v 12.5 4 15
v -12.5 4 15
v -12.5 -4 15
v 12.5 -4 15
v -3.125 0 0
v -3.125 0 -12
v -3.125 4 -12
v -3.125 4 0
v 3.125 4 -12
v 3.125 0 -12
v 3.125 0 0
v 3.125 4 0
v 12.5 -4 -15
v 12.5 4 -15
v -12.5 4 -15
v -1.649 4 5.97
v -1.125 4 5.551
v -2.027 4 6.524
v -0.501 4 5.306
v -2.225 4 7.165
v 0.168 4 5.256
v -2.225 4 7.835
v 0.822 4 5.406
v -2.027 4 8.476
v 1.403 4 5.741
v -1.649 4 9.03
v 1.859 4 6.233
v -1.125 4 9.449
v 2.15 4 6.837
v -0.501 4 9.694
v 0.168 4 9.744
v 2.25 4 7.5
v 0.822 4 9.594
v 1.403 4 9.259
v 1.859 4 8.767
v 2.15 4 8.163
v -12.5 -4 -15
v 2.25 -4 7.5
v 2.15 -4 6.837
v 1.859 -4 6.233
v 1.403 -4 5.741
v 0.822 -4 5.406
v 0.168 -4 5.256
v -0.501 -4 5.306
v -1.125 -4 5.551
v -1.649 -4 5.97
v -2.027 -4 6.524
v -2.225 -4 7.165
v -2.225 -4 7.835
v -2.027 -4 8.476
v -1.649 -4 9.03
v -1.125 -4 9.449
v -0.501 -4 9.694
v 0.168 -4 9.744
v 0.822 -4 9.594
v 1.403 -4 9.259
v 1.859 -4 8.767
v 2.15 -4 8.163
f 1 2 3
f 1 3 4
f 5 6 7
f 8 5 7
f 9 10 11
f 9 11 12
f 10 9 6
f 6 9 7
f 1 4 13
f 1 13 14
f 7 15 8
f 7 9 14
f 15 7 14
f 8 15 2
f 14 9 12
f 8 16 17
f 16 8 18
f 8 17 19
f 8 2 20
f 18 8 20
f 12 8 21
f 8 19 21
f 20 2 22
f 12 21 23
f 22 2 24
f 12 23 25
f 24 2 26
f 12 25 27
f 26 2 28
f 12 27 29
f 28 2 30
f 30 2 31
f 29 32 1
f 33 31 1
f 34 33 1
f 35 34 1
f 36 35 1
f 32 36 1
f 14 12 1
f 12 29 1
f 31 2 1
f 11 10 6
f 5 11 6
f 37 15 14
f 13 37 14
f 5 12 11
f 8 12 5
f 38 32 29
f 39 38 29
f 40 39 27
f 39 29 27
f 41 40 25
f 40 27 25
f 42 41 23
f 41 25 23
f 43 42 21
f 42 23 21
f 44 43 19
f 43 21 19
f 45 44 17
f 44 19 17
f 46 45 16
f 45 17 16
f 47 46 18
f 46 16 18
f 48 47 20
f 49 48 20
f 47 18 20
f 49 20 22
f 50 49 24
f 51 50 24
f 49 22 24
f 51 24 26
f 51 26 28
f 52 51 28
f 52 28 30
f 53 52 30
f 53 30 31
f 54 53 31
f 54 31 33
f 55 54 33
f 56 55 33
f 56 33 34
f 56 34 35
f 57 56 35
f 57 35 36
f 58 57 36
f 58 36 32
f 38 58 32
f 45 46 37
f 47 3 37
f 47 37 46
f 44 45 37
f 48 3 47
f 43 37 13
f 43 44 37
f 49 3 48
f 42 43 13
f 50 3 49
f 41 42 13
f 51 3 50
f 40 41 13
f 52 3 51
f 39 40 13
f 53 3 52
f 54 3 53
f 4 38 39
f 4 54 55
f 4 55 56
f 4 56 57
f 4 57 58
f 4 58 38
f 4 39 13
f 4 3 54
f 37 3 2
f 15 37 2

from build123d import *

# Parameters (mm, degrees)
SKETCH1_W            = 25
SKETCH1_H            = 8
BOSS_EXTRUDE1_DEPTH  = 15
SKETCH3_W            = 6.25
SKETCH3_H            = 4
CUT_EXTRUDE1_DEPTH   = 12
M4_CLEARANCE_HOLE1_D = 4.5


with BuildPart() as part:
    # Sketch1 → Boss-Extrude1 (new, symmetric)
    with BuildSketch(Plane.XY):
        Rectangle(SKETCH1_W, SKETCH1_H)
    extrude(amount=BOSS_EXTRUDE1_DEPTH, both=True)

    # Sketch3 → Cut-Extrude1 (cut)
    with BuildSketch(Plane(origin=(0, 0, -12), x_dir=(-1, 0, 0), z_dir=(0, 0, -1))):
        with Locations((0, 2)):
            Rectangle(SKETCH3_W, SKETCH3_H)
    extrude(amount=-CUT_EXTRUDE1_DEPTH, mode=Mode.SUBTRACT)

    # M4 Clearance Hole1 (through all)
    with Locations(Plane(origin=(0, -4, 0), x_dir=(-1, 0, 0), z_dir=(0, -1, 0))):
        with Locations((0, -7.5)):
            Hole(M4_CLEARANCE_HOLE1_D / 2)


solid = part.part
